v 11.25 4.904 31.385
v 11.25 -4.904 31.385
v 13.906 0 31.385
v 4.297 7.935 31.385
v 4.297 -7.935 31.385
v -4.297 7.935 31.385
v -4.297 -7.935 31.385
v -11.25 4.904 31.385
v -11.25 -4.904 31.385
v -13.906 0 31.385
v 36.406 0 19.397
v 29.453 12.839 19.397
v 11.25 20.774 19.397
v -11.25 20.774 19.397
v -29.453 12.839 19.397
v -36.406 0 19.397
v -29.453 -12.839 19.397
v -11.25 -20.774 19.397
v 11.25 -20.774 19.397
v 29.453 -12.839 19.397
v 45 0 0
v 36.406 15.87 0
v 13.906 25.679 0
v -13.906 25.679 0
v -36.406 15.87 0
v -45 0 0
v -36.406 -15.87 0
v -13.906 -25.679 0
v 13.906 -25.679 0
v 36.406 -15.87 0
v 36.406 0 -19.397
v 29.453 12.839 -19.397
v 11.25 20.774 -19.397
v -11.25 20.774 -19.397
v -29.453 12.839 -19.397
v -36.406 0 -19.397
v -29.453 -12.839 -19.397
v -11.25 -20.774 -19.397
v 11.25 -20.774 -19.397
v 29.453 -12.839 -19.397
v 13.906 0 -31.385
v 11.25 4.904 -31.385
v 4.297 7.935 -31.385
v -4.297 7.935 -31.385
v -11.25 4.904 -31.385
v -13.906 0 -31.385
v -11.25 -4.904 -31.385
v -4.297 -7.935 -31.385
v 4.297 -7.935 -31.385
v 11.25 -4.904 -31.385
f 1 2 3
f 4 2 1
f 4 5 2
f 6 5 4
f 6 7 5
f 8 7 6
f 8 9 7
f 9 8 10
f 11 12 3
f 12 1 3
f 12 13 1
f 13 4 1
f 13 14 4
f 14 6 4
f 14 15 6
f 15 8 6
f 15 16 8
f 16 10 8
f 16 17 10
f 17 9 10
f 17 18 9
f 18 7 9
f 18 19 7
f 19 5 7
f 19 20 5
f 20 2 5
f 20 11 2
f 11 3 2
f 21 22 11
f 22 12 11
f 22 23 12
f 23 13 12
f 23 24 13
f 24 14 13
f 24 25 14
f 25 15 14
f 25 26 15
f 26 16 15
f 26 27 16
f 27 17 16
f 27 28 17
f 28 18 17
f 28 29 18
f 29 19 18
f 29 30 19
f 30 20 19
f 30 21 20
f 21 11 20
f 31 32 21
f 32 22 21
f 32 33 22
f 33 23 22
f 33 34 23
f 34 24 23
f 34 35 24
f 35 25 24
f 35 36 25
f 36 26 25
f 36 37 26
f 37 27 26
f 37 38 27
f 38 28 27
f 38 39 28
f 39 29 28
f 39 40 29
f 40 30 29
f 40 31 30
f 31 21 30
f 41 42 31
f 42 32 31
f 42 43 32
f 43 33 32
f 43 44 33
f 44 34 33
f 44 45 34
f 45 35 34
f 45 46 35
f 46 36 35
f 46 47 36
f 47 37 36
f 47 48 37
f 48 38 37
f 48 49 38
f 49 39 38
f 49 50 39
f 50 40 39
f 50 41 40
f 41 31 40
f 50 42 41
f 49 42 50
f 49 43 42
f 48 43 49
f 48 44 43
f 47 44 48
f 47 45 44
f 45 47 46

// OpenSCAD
// Generated by SolidPython 1.0.1 on 2020-07-29 00:46:52


scale(v = [15, 9, 11]) {
	sphere(r = 3);
}
/***********************************************
*********      SolidPython code:      **********
************************************************
 
# import packages: SolidPython
from solid import *
from solid.utils import *
from itertools import chain, combinations, permutations


class Resize:

    def __init__(self, scad_file):
        self.scad_file = scad_file
        #self.scad_file = import_scad(scad_file)
        # cone/cylinder param:
        self.r1 = 0
        self.r2 = 0
        self.h = 0
        # rectangular prism param:
        self.w = 0
        self.l = 0
        # ellipse param:
        self.r = 0

    # import OpenScad code (file name corresponds to shape)


    # classify shape + parameters
    def assign(self, param1, param2, param3):
        if self.scad_file == 'cone.scad':
            self.r1 = param1
            self.r2 = param2
            self.h = param3
        elif self.scad_file == 'cylinder.scad':
            self.r1 = param1
            self.r2 = param2
            self.h = param3
        elif self.scad_file == 'rectangularPrism.scad':
            self.h = param1
            self.l = param2
            self.w = param3
        else:
            self.r = param1
            self.h = param2

    # resize parameters
    def iterate(self):
        x = range(3, 20, 2)
        i = 1
        if self.scad_file == 'cone.scad':
            tempList = list(permutations(x, 2))
            for temp in tempList:
                param1 = temp[0]
                param2 = temp[1]
                filepath = 'produced_scad_files/' + 'cone' + str(param1) + '_' + str(param2) + '_' + '.scad'
                scad_render_to_file(cylinder(h=param1, r1=param2, r2=0), filepath)

        elif self.scad_file == 'cylinder.scad':
            tempList = list(permutations(x, 3))
            for temp in tempList:
                param1 = temp[0]
                param2 = temp[1]
                filepath = 'produced_scad_files/' + 'cylinder' + str(param1) + '_' + str(param2) + '_' + '.scad'
                scad_render_to_file(cylinder(h=param1, r1=param2, r2=param2), filepath)

        elif self.scad_file == 'rectangularPrism.scad':
            tempList = list(permutations(x, 3))
            for temp in tempList:
                param1 = temp[0]
                param2 = temp[1]
                param3 = temp[2]
                filepath = 'produced_scad_files/' + 'rectangularPrism' + str(param1) + '_' + str(param2) + '_' + str(
                    param3) + '.scad'
                scad_render_to_file(cube(size=(param1, param2, param3)), filepath)

        elif self.scad_file == 'ellipse.scad':
            tempList = list(permutations(x, 4))
            for temp in tempList:
                param1 = temp[0]
                param2 = temp[1]
                param3 = temp[2]
                param4 = temp[3]
                filepath = 'produced_scad_files/' + 'ellipse' + str(param1) + '_' + str(param2) + '_' + str(param3) + '_' + str(param4) + '.scad'
                scad_render_to_file(scale([param1, param2, param3])(sphere(r=param4)), filepath)

    def render_to_scadfile(self):
        scad_render_to_file(scad, 'example.scad') 
 
************************************************/
